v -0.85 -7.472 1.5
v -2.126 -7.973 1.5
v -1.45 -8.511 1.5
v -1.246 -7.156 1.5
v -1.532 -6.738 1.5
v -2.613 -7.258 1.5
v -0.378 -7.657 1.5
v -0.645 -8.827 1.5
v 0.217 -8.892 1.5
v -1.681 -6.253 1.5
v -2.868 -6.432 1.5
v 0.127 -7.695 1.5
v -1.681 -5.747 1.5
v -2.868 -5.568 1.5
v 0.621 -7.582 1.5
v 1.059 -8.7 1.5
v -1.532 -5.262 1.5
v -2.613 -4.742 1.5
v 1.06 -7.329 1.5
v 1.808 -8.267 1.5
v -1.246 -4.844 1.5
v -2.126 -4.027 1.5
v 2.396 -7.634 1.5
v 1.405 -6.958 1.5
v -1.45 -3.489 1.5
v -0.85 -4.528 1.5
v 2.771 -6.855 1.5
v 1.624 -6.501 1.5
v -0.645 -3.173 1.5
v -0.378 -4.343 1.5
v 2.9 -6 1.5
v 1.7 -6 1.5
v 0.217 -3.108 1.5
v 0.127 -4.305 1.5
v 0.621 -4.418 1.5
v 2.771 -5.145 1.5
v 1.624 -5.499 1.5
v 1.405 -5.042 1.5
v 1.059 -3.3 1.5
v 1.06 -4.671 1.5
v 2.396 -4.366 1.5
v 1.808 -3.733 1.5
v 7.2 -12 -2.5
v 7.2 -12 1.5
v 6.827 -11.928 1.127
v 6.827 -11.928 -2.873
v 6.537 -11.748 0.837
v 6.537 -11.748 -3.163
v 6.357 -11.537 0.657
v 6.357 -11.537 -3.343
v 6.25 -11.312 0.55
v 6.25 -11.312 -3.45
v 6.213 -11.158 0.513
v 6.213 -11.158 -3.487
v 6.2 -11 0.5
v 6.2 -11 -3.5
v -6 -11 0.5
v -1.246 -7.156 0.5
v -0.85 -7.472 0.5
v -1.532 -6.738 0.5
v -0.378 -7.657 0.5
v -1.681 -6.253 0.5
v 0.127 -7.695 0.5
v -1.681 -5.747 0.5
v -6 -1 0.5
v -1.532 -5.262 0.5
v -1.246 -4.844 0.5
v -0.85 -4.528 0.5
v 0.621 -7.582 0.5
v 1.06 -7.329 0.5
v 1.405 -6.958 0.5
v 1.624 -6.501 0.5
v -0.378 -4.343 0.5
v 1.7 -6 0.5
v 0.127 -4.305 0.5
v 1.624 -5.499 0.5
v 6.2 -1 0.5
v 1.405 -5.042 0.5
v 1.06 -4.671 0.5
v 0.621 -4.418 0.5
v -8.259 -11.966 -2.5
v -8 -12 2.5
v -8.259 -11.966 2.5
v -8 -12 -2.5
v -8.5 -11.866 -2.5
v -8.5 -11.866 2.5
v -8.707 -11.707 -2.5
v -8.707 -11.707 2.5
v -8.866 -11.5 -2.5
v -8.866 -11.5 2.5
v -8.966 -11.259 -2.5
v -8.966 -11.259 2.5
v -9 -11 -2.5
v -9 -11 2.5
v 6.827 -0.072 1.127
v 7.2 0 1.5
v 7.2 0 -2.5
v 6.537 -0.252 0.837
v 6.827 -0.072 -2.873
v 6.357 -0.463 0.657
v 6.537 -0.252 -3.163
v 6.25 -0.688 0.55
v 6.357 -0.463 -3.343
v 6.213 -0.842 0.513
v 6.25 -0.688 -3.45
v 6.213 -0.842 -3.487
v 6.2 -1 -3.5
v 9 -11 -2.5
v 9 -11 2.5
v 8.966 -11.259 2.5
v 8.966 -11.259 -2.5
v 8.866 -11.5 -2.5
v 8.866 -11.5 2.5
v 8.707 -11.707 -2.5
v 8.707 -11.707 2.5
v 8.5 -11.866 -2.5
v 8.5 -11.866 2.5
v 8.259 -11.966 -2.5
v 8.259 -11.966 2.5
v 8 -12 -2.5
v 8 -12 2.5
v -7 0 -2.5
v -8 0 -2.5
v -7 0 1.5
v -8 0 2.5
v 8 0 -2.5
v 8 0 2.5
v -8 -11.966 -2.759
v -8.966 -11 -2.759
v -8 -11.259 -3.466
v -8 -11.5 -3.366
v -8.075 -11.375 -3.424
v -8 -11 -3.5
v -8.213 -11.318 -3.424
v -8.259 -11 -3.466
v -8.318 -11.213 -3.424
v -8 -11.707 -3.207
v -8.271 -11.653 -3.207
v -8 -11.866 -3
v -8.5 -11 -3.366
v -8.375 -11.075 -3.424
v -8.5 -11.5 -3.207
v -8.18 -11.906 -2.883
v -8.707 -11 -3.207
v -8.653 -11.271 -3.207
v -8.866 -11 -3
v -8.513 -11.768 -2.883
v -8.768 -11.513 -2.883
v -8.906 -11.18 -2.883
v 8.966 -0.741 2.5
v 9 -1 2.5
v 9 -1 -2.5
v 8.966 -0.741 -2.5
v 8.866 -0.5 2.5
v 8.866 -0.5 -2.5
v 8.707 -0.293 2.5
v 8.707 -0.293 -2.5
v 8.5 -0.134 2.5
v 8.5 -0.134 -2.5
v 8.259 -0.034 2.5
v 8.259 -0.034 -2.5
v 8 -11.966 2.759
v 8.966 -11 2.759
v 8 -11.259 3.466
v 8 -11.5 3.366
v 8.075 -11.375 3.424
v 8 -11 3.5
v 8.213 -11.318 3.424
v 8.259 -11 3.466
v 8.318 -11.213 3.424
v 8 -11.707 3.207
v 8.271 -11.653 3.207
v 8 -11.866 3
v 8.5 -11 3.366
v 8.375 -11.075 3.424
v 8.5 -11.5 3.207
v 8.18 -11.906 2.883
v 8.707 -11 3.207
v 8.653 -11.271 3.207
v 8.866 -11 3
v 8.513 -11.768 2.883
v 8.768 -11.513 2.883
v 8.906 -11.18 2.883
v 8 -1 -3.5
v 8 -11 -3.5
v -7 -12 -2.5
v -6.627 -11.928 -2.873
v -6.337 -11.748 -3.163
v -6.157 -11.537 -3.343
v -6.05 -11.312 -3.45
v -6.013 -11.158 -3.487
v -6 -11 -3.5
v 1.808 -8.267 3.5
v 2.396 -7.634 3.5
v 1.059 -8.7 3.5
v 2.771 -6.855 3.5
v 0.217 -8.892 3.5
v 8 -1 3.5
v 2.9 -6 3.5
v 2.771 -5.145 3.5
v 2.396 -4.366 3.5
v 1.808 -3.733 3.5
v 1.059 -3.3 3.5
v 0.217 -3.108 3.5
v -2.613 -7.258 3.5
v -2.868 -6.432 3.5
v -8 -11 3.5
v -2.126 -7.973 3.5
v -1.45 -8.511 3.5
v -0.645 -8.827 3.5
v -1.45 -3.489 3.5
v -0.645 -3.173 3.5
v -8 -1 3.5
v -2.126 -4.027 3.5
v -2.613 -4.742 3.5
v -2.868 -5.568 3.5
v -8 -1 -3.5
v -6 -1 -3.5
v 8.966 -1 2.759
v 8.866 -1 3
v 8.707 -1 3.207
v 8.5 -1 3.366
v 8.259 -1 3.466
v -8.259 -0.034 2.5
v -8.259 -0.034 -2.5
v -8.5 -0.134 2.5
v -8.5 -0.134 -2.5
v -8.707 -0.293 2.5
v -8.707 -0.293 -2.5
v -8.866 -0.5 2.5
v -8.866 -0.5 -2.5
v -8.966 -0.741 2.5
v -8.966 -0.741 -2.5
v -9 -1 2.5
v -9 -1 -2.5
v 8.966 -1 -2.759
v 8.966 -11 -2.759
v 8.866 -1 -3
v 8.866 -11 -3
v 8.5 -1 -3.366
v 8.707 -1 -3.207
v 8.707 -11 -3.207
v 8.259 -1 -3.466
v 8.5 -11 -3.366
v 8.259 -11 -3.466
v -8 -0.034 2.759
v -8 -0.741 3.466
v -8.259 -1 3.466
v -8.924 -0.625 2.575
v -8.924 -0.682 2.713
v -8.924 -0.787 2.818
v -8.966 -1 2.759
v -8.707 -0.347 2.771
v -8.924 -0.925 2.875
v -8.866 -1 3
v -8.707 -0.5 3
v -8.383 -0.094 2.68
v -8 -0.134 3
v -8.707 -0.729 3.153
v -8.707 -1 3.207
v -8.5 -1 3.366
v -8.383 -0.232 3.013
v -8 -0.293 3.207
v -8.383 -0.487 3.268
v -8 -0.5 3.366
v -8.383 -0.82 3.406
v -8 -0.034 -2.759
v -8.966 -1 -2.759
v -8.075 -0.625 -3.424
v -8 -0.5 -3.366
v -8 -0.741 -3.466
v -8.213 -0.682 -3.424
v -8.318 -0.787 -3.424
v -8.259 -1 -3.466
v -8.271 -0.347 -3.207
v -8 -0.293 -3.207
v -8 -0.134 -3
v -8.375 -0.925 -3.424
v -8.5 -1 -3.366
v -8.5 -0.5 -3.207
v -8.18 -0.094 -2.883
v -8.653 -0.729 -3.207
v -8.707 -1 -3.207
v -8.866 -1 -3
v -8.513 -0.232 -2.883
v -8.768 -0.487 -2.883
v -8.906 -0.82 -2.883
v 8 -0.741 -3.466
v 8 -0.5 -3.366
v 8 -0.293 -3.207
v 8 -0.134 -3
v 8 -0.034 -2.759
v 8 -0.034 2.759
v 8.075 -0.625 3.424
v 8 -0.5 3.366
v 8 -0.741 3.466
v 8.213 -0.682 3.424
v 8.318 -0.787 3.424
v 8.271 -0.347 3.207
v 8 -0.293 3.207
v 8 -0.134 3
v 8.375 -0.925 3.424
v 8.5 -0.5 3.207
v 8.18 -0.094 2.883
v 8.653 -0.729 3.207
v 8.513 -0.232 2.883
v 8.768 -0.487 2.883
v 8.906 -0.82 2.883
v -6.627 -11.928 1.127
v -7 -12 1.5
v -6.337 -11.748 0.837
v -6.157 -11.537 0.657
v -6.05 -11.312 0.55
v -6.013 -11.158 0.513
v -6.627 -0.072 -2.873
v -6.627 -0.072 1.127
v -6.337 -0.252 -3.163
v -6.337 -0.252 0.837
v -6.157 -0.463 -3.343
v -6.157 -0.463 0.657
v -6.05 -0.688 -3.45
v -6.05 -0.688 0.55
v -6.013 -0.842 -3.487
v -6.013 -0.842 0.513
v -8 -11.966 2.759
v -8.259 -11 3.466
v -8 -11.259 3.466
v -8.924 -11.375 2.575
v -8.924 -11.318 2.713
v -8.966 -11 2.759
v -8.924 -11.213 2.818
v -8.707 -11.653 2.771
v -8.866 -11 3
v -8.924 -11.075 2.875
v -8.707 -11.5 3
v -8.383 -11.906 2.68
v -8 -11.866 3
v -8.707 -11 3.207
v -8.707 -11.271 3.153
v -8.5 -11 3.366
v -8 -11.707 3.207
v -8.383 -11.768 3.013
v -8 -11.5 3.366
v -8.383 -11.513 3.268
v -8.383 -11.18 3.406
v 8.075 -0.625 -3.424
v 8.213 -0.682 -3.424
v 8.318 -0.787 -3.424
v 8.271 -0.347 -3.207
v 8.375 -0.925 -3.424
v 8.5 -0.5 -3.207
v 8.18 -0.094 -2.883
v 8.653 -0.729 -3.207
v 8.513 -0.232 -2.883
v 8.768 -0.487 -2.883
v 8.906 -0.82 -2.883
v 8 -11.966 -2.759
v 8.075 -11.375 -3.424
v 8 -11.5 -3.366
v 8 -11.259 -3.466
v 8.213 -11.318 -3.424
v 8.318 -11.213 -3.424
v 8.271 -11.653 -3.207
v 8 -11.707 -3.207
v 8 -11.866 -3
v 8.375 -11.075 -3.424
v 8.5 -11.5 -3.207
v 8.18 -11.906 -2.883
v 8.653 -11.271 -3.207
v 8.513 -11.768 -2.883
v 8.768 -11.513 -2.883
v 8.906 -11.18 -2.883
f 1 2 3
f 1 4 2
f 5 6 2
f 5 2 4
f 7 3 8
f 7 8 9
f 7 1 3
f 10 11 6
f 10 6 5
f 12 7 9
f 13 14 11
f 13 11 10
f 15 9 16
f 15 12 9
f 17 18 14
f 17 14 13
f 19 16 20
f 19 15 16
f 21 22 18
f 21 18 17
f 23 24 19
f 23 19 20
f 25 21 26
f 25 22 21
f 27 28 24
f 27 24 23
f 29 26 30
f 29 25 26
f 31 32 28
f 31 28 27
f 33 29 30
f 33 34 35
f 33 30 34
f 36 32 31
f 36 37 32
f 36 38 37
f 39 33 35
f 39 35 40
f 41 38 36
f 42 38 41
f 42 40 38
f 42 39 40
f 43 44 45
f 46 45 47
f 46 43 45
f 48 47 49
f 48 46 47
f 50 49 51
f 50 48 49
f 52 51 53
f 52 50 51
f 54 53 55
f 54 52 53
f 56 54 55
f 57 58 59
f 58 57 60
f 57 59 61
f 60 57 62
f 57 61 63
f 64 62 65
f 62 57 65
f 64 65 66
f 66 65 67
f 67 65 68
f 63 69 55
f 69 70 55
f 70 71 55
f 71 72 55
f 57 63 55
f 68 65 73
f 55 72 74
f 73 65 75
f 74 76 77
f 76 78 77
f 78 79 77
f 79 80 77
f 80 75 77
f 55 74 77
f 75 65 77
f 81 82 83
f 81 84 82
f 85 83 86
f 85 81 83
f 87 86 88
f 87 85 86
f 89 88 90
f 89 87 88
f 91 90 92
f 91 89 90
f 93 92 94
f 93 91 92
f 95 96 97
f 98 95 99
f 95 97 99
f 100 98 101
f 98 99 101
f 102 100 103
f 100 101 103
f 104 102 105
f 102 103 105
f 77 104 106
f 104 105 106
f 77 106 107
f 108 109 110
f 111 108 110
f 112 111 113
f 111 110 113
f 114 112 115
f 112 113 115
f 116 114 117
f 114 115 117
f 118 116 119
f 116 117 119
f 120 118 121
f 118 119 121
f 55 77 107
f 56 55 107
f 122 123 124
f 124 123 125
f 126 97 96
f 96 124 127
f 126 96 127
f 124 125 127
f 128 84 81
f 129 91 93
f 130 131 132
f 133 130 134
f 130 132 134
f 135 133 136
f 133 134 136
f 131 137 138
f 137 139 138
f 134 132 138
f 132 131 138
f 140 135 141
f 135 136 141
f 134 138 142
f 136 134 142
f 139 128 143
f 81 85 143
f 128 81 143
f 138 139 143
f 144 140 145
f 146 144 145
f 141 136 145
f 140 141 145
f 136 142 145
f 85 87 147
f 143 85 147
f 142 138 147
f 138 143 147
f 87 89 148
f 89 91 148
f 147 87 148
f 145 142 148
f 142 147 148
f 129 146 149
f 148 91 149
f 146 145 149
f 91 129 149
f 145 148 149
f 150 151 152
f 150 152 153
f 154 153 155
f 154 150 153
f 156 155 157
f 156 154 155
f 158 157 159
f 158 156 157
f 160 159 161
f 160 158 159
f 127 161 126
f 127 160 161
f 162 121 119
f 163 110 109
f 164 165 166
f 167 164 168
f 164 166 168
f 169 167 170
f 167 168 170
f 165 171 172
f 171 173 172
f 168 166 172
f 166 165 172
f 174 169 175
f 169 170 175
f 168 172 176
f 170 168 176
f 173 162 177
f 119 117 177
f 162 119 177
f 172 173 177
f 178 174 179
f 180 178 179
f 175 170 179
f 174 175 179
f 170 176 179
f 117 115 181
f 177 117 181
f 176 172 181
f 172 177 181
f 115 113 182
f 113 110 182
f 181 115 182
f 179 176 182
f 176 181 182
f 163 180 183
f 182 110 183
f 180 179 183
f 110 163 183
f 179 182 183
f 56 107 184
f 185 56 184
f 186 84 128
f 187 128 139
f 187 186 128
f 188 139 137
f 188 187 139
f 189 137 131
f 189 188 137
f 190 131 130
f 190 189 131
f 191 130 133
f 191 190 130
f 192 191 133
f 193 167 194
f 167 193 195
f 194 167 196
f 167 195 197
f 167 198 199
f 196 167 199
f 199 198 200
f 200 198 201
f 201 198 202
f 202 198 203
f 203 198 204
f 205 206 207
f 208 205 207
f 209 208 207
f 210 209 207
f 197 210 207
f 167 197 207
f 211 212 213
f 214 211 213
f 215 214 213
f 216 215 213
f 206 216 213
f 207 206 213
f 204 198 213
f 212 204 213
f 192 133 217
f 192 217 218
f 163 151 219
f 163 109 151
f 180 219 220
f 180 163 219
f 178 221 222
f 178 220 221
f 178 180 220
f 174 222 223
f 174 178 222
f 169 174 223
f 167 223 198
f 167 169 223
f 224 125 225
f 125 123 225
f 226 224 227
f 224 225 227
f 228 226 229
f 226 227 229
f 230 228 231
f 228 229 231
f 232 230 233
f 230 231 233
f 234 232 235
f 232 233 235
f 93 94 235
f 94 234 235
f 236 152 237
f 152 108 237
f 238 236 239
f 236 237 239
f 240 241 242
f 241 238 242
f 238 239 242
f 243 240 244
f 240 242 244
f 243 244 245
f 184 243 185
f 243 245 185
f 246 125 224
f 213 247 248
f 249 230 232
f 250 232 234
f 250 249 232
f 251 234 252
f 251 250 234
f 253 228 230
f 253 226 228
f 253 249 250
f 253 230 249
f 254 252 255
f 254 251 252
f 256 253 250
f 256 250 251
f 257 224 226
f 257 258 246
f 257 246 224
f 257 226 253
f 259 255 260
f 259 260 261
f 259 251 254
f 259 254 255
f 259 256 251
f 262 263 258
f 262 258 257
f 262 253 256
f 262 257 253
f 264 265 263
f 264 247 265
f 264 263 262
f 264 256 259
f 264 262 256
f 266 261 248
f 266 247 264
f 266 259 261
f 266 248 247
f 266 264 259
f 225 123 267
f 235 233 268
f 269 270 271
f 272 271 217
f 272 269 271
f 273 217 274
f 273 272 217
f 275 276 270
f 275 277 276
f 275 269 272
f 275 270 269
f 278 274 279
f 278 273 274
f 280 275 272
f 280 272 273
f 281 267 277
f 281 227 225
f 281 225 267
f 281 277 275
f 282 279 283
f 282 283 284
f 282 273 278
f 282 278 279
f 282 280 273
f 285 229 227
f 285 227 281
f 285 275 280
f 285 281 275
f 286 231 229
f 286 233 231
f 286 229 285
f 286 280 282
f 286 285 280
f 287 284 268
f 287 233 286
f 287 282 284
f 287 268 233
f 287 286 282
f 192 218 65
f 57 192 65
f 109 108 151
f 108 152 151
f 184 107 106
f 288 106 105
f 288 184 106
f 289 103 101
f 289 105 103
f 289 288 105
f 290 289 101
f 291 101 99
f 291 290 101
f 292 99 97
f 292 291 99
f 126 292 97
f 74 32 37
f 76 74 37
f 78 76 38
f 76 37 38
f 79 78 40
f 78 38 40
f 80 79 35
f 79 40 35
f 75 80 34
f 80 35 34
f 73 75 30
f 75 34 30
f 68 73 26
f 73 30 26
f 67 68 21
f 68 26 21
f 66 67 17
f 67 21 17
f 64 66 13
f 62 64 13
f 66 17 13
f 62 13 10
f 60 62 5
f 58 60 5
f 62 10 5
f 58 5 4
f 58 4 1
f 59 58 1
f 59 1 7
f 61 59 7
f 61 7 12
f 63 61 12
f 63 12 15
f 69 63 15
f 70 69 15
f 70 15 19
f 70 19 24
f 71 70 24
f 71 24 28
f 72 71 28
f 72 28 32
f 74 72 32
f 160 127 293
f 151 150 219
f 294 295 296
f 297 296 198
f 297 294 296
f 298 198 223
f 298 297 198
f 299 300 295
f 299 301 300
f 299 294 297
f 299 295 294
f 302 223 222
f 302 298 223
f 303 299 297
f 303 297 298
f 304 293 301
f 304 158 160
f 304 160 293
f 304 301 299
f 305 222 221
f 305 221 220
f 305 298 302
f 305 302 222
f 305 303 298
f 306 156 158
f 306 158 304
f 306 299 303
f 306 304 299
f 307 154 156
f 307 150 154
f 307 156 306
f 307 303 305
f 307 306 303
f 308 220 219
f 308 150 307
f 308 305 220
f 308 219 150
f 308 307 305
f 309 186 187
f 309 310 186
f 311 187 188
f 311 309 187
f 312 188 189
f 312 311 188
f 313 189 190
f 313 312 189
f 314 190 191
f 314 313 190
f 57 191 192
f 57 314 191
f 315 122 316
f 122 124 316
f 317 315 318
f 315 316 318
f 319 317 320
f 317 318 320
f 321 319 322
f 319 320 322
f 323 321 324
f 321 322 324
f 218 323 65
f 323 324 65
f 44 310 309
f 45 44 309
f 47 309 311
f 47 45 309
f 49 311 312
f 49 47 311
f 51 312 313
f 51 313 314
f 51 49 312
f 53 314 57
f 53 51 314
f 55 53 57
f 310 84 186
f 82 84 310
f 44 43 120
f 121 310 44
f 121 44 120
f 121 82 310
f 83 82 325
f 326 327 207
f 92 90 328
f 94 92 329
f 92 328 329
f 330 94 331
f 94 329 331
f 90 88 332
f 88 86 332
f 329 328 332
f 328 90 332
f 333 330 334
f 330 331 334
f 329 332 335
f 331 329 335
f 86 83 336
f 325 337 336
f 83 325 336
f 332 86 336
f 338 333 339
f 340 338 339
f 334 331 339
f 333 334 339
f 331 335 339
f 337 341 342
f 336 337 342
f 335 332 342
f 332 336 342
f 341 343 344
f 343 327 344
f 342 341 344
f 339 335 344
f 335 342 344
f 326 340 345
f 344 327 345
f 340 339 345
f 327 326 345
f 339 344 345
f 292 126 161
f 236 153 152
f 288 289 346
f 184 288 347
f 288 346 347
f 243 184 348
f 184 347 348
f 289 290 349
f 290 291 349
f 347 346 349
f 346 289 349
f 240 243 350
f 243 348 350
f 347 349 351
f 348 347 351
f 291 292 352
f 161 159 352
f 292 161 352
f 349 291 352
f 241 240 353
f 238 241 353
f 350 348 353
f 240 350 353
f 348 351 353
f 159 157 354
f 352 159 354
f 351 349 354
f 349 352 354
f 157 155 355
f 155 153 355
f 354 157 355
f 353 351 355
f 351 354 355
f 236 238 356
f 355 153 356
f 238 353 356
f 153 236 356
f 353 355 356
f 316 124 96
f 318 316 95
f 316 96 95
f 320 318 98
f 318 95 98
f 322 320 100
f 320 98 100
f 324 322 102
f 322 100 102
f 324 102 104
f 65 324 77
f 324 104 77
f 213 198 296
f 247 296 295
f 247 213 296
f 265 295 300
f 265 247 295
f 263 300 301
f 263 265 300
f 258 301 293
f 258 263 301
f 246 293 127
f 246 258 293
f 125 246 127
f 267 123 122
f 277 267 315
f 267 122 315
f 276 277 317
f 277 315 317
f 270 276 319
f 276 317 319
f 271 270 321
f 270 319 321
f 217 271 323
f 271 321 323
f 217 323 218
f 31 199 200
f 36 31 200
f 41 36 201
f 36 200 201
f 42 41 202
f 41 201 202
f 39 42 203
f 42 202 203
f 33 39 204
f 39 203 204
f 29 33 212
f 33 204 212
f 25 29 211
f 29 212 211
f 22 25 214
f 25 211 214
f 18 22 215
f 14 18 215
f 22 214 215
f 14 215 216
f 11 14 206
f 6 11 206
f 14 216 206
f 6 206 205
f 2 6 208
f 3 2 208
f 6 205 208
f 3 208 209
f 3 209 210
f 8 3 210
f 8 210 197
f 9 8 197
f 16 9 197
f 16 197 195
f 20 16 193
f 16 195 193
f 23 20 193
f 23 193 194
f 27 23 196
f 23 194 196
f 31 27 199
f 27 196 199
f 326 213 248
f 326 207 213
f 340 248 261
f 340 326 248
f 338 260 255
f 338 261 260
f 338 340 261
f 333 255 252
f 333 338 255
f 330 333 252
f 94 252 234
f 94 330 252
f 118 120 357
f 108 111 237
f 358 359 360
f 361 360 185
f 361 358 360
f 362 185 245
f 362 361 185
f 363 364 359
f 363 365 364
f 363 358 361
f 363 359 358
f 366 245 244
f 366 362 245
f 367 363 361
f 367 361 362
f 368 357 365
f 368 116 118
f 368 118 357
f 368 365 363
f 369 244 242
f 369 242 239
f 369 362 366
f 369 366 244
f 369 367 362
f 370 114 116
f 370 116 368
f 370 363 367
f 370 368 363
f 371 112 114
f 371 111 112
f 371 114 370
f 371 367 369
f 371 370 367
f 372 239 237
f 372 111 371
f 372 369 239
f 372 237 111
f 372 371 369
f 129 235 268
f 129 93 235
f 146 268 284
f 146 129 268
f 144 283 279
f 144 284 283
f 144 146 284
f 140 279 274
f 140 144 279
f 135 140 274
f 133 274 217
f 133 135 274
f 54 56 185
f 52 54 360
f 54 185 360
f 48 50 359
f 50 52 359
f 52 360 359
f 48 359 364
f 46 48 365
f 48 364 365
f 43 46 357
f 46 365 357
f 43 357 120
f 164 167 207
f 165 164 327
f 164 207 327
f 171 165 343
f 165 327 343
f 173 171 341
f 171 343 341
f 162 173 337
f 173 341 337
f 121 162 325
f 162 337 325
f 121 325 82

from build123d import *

# Parameters (mm, degrees)
F1_DEPTH = 12
F2_R     = 1.7
F3_DEPTH = 7.001
F2_R_2   = 2.9
F4_DEPTH = 2
F5_R     = 1


with BuildPart() as f1:
    # F0 (on Front) → F1 (new body)
    with BuildSketch(Plane.XZ):
        Polygon((9, -3.5), (9, 3.5), (-9, 3.5), (-9, -3.5), (-6, -3.5), (-6, 0.5), (6.2, 0.5), (6.2, -3.5), align=None)
    extrude(amount=F1_DEPTH)

    # F2 (on face) → F3 (cut, through all)
    with BuildSketch(Plane.XY.offset(3.5)):
        with Locations((0, -6)):
            Circle(F2_R)
    extrude(amount=-F3_DEPTH, mode=Mode.SUBTRACT)

    # F2 (on face) → F4 (cut)
    with BuildSketch(Plane.XY.offset(3.5)):
        with Locations((0, -6)):
            Circle(F2_R_2)
        with Locations((0, -6)):
            Circle(F2_R, mode=Mode.SUBTRACT)
    extrude(amount=-F4_DEPTH, mode=Mode.SUBTRACT)

    # F5
    f5_edges = [f1.edges().sort_by_distance(p)[0] for p in [
        (9, -12, 0),
        (0, -12, 3.5),
        (-9, -12, 0),
        (-7.5, -12, -3.5),
        (-6, -12, -1.5),
        (0.1, -12, 0.5),
        (6.2, -12, -1.5),
        (7.6, -12, -3.5),
        (9, 0, 0),
        (0, 0, 3.5),
        (-9, 0, 0),
        (-7.5, 0, -3.5),
        (-6, 0, -1.5),
        (0.1, 0, 0.5),
        (6.2, 0, -1.5),
        (7.6, 0, -3.5),
        (9, -6, -3.5),
        (-9, -6, -3.5),
        (-9, -6, 3.5),
        (9, -6, 3.5),
    ]]
    fillet(f5_edges, radius=F5_R)


solid = f1.part
